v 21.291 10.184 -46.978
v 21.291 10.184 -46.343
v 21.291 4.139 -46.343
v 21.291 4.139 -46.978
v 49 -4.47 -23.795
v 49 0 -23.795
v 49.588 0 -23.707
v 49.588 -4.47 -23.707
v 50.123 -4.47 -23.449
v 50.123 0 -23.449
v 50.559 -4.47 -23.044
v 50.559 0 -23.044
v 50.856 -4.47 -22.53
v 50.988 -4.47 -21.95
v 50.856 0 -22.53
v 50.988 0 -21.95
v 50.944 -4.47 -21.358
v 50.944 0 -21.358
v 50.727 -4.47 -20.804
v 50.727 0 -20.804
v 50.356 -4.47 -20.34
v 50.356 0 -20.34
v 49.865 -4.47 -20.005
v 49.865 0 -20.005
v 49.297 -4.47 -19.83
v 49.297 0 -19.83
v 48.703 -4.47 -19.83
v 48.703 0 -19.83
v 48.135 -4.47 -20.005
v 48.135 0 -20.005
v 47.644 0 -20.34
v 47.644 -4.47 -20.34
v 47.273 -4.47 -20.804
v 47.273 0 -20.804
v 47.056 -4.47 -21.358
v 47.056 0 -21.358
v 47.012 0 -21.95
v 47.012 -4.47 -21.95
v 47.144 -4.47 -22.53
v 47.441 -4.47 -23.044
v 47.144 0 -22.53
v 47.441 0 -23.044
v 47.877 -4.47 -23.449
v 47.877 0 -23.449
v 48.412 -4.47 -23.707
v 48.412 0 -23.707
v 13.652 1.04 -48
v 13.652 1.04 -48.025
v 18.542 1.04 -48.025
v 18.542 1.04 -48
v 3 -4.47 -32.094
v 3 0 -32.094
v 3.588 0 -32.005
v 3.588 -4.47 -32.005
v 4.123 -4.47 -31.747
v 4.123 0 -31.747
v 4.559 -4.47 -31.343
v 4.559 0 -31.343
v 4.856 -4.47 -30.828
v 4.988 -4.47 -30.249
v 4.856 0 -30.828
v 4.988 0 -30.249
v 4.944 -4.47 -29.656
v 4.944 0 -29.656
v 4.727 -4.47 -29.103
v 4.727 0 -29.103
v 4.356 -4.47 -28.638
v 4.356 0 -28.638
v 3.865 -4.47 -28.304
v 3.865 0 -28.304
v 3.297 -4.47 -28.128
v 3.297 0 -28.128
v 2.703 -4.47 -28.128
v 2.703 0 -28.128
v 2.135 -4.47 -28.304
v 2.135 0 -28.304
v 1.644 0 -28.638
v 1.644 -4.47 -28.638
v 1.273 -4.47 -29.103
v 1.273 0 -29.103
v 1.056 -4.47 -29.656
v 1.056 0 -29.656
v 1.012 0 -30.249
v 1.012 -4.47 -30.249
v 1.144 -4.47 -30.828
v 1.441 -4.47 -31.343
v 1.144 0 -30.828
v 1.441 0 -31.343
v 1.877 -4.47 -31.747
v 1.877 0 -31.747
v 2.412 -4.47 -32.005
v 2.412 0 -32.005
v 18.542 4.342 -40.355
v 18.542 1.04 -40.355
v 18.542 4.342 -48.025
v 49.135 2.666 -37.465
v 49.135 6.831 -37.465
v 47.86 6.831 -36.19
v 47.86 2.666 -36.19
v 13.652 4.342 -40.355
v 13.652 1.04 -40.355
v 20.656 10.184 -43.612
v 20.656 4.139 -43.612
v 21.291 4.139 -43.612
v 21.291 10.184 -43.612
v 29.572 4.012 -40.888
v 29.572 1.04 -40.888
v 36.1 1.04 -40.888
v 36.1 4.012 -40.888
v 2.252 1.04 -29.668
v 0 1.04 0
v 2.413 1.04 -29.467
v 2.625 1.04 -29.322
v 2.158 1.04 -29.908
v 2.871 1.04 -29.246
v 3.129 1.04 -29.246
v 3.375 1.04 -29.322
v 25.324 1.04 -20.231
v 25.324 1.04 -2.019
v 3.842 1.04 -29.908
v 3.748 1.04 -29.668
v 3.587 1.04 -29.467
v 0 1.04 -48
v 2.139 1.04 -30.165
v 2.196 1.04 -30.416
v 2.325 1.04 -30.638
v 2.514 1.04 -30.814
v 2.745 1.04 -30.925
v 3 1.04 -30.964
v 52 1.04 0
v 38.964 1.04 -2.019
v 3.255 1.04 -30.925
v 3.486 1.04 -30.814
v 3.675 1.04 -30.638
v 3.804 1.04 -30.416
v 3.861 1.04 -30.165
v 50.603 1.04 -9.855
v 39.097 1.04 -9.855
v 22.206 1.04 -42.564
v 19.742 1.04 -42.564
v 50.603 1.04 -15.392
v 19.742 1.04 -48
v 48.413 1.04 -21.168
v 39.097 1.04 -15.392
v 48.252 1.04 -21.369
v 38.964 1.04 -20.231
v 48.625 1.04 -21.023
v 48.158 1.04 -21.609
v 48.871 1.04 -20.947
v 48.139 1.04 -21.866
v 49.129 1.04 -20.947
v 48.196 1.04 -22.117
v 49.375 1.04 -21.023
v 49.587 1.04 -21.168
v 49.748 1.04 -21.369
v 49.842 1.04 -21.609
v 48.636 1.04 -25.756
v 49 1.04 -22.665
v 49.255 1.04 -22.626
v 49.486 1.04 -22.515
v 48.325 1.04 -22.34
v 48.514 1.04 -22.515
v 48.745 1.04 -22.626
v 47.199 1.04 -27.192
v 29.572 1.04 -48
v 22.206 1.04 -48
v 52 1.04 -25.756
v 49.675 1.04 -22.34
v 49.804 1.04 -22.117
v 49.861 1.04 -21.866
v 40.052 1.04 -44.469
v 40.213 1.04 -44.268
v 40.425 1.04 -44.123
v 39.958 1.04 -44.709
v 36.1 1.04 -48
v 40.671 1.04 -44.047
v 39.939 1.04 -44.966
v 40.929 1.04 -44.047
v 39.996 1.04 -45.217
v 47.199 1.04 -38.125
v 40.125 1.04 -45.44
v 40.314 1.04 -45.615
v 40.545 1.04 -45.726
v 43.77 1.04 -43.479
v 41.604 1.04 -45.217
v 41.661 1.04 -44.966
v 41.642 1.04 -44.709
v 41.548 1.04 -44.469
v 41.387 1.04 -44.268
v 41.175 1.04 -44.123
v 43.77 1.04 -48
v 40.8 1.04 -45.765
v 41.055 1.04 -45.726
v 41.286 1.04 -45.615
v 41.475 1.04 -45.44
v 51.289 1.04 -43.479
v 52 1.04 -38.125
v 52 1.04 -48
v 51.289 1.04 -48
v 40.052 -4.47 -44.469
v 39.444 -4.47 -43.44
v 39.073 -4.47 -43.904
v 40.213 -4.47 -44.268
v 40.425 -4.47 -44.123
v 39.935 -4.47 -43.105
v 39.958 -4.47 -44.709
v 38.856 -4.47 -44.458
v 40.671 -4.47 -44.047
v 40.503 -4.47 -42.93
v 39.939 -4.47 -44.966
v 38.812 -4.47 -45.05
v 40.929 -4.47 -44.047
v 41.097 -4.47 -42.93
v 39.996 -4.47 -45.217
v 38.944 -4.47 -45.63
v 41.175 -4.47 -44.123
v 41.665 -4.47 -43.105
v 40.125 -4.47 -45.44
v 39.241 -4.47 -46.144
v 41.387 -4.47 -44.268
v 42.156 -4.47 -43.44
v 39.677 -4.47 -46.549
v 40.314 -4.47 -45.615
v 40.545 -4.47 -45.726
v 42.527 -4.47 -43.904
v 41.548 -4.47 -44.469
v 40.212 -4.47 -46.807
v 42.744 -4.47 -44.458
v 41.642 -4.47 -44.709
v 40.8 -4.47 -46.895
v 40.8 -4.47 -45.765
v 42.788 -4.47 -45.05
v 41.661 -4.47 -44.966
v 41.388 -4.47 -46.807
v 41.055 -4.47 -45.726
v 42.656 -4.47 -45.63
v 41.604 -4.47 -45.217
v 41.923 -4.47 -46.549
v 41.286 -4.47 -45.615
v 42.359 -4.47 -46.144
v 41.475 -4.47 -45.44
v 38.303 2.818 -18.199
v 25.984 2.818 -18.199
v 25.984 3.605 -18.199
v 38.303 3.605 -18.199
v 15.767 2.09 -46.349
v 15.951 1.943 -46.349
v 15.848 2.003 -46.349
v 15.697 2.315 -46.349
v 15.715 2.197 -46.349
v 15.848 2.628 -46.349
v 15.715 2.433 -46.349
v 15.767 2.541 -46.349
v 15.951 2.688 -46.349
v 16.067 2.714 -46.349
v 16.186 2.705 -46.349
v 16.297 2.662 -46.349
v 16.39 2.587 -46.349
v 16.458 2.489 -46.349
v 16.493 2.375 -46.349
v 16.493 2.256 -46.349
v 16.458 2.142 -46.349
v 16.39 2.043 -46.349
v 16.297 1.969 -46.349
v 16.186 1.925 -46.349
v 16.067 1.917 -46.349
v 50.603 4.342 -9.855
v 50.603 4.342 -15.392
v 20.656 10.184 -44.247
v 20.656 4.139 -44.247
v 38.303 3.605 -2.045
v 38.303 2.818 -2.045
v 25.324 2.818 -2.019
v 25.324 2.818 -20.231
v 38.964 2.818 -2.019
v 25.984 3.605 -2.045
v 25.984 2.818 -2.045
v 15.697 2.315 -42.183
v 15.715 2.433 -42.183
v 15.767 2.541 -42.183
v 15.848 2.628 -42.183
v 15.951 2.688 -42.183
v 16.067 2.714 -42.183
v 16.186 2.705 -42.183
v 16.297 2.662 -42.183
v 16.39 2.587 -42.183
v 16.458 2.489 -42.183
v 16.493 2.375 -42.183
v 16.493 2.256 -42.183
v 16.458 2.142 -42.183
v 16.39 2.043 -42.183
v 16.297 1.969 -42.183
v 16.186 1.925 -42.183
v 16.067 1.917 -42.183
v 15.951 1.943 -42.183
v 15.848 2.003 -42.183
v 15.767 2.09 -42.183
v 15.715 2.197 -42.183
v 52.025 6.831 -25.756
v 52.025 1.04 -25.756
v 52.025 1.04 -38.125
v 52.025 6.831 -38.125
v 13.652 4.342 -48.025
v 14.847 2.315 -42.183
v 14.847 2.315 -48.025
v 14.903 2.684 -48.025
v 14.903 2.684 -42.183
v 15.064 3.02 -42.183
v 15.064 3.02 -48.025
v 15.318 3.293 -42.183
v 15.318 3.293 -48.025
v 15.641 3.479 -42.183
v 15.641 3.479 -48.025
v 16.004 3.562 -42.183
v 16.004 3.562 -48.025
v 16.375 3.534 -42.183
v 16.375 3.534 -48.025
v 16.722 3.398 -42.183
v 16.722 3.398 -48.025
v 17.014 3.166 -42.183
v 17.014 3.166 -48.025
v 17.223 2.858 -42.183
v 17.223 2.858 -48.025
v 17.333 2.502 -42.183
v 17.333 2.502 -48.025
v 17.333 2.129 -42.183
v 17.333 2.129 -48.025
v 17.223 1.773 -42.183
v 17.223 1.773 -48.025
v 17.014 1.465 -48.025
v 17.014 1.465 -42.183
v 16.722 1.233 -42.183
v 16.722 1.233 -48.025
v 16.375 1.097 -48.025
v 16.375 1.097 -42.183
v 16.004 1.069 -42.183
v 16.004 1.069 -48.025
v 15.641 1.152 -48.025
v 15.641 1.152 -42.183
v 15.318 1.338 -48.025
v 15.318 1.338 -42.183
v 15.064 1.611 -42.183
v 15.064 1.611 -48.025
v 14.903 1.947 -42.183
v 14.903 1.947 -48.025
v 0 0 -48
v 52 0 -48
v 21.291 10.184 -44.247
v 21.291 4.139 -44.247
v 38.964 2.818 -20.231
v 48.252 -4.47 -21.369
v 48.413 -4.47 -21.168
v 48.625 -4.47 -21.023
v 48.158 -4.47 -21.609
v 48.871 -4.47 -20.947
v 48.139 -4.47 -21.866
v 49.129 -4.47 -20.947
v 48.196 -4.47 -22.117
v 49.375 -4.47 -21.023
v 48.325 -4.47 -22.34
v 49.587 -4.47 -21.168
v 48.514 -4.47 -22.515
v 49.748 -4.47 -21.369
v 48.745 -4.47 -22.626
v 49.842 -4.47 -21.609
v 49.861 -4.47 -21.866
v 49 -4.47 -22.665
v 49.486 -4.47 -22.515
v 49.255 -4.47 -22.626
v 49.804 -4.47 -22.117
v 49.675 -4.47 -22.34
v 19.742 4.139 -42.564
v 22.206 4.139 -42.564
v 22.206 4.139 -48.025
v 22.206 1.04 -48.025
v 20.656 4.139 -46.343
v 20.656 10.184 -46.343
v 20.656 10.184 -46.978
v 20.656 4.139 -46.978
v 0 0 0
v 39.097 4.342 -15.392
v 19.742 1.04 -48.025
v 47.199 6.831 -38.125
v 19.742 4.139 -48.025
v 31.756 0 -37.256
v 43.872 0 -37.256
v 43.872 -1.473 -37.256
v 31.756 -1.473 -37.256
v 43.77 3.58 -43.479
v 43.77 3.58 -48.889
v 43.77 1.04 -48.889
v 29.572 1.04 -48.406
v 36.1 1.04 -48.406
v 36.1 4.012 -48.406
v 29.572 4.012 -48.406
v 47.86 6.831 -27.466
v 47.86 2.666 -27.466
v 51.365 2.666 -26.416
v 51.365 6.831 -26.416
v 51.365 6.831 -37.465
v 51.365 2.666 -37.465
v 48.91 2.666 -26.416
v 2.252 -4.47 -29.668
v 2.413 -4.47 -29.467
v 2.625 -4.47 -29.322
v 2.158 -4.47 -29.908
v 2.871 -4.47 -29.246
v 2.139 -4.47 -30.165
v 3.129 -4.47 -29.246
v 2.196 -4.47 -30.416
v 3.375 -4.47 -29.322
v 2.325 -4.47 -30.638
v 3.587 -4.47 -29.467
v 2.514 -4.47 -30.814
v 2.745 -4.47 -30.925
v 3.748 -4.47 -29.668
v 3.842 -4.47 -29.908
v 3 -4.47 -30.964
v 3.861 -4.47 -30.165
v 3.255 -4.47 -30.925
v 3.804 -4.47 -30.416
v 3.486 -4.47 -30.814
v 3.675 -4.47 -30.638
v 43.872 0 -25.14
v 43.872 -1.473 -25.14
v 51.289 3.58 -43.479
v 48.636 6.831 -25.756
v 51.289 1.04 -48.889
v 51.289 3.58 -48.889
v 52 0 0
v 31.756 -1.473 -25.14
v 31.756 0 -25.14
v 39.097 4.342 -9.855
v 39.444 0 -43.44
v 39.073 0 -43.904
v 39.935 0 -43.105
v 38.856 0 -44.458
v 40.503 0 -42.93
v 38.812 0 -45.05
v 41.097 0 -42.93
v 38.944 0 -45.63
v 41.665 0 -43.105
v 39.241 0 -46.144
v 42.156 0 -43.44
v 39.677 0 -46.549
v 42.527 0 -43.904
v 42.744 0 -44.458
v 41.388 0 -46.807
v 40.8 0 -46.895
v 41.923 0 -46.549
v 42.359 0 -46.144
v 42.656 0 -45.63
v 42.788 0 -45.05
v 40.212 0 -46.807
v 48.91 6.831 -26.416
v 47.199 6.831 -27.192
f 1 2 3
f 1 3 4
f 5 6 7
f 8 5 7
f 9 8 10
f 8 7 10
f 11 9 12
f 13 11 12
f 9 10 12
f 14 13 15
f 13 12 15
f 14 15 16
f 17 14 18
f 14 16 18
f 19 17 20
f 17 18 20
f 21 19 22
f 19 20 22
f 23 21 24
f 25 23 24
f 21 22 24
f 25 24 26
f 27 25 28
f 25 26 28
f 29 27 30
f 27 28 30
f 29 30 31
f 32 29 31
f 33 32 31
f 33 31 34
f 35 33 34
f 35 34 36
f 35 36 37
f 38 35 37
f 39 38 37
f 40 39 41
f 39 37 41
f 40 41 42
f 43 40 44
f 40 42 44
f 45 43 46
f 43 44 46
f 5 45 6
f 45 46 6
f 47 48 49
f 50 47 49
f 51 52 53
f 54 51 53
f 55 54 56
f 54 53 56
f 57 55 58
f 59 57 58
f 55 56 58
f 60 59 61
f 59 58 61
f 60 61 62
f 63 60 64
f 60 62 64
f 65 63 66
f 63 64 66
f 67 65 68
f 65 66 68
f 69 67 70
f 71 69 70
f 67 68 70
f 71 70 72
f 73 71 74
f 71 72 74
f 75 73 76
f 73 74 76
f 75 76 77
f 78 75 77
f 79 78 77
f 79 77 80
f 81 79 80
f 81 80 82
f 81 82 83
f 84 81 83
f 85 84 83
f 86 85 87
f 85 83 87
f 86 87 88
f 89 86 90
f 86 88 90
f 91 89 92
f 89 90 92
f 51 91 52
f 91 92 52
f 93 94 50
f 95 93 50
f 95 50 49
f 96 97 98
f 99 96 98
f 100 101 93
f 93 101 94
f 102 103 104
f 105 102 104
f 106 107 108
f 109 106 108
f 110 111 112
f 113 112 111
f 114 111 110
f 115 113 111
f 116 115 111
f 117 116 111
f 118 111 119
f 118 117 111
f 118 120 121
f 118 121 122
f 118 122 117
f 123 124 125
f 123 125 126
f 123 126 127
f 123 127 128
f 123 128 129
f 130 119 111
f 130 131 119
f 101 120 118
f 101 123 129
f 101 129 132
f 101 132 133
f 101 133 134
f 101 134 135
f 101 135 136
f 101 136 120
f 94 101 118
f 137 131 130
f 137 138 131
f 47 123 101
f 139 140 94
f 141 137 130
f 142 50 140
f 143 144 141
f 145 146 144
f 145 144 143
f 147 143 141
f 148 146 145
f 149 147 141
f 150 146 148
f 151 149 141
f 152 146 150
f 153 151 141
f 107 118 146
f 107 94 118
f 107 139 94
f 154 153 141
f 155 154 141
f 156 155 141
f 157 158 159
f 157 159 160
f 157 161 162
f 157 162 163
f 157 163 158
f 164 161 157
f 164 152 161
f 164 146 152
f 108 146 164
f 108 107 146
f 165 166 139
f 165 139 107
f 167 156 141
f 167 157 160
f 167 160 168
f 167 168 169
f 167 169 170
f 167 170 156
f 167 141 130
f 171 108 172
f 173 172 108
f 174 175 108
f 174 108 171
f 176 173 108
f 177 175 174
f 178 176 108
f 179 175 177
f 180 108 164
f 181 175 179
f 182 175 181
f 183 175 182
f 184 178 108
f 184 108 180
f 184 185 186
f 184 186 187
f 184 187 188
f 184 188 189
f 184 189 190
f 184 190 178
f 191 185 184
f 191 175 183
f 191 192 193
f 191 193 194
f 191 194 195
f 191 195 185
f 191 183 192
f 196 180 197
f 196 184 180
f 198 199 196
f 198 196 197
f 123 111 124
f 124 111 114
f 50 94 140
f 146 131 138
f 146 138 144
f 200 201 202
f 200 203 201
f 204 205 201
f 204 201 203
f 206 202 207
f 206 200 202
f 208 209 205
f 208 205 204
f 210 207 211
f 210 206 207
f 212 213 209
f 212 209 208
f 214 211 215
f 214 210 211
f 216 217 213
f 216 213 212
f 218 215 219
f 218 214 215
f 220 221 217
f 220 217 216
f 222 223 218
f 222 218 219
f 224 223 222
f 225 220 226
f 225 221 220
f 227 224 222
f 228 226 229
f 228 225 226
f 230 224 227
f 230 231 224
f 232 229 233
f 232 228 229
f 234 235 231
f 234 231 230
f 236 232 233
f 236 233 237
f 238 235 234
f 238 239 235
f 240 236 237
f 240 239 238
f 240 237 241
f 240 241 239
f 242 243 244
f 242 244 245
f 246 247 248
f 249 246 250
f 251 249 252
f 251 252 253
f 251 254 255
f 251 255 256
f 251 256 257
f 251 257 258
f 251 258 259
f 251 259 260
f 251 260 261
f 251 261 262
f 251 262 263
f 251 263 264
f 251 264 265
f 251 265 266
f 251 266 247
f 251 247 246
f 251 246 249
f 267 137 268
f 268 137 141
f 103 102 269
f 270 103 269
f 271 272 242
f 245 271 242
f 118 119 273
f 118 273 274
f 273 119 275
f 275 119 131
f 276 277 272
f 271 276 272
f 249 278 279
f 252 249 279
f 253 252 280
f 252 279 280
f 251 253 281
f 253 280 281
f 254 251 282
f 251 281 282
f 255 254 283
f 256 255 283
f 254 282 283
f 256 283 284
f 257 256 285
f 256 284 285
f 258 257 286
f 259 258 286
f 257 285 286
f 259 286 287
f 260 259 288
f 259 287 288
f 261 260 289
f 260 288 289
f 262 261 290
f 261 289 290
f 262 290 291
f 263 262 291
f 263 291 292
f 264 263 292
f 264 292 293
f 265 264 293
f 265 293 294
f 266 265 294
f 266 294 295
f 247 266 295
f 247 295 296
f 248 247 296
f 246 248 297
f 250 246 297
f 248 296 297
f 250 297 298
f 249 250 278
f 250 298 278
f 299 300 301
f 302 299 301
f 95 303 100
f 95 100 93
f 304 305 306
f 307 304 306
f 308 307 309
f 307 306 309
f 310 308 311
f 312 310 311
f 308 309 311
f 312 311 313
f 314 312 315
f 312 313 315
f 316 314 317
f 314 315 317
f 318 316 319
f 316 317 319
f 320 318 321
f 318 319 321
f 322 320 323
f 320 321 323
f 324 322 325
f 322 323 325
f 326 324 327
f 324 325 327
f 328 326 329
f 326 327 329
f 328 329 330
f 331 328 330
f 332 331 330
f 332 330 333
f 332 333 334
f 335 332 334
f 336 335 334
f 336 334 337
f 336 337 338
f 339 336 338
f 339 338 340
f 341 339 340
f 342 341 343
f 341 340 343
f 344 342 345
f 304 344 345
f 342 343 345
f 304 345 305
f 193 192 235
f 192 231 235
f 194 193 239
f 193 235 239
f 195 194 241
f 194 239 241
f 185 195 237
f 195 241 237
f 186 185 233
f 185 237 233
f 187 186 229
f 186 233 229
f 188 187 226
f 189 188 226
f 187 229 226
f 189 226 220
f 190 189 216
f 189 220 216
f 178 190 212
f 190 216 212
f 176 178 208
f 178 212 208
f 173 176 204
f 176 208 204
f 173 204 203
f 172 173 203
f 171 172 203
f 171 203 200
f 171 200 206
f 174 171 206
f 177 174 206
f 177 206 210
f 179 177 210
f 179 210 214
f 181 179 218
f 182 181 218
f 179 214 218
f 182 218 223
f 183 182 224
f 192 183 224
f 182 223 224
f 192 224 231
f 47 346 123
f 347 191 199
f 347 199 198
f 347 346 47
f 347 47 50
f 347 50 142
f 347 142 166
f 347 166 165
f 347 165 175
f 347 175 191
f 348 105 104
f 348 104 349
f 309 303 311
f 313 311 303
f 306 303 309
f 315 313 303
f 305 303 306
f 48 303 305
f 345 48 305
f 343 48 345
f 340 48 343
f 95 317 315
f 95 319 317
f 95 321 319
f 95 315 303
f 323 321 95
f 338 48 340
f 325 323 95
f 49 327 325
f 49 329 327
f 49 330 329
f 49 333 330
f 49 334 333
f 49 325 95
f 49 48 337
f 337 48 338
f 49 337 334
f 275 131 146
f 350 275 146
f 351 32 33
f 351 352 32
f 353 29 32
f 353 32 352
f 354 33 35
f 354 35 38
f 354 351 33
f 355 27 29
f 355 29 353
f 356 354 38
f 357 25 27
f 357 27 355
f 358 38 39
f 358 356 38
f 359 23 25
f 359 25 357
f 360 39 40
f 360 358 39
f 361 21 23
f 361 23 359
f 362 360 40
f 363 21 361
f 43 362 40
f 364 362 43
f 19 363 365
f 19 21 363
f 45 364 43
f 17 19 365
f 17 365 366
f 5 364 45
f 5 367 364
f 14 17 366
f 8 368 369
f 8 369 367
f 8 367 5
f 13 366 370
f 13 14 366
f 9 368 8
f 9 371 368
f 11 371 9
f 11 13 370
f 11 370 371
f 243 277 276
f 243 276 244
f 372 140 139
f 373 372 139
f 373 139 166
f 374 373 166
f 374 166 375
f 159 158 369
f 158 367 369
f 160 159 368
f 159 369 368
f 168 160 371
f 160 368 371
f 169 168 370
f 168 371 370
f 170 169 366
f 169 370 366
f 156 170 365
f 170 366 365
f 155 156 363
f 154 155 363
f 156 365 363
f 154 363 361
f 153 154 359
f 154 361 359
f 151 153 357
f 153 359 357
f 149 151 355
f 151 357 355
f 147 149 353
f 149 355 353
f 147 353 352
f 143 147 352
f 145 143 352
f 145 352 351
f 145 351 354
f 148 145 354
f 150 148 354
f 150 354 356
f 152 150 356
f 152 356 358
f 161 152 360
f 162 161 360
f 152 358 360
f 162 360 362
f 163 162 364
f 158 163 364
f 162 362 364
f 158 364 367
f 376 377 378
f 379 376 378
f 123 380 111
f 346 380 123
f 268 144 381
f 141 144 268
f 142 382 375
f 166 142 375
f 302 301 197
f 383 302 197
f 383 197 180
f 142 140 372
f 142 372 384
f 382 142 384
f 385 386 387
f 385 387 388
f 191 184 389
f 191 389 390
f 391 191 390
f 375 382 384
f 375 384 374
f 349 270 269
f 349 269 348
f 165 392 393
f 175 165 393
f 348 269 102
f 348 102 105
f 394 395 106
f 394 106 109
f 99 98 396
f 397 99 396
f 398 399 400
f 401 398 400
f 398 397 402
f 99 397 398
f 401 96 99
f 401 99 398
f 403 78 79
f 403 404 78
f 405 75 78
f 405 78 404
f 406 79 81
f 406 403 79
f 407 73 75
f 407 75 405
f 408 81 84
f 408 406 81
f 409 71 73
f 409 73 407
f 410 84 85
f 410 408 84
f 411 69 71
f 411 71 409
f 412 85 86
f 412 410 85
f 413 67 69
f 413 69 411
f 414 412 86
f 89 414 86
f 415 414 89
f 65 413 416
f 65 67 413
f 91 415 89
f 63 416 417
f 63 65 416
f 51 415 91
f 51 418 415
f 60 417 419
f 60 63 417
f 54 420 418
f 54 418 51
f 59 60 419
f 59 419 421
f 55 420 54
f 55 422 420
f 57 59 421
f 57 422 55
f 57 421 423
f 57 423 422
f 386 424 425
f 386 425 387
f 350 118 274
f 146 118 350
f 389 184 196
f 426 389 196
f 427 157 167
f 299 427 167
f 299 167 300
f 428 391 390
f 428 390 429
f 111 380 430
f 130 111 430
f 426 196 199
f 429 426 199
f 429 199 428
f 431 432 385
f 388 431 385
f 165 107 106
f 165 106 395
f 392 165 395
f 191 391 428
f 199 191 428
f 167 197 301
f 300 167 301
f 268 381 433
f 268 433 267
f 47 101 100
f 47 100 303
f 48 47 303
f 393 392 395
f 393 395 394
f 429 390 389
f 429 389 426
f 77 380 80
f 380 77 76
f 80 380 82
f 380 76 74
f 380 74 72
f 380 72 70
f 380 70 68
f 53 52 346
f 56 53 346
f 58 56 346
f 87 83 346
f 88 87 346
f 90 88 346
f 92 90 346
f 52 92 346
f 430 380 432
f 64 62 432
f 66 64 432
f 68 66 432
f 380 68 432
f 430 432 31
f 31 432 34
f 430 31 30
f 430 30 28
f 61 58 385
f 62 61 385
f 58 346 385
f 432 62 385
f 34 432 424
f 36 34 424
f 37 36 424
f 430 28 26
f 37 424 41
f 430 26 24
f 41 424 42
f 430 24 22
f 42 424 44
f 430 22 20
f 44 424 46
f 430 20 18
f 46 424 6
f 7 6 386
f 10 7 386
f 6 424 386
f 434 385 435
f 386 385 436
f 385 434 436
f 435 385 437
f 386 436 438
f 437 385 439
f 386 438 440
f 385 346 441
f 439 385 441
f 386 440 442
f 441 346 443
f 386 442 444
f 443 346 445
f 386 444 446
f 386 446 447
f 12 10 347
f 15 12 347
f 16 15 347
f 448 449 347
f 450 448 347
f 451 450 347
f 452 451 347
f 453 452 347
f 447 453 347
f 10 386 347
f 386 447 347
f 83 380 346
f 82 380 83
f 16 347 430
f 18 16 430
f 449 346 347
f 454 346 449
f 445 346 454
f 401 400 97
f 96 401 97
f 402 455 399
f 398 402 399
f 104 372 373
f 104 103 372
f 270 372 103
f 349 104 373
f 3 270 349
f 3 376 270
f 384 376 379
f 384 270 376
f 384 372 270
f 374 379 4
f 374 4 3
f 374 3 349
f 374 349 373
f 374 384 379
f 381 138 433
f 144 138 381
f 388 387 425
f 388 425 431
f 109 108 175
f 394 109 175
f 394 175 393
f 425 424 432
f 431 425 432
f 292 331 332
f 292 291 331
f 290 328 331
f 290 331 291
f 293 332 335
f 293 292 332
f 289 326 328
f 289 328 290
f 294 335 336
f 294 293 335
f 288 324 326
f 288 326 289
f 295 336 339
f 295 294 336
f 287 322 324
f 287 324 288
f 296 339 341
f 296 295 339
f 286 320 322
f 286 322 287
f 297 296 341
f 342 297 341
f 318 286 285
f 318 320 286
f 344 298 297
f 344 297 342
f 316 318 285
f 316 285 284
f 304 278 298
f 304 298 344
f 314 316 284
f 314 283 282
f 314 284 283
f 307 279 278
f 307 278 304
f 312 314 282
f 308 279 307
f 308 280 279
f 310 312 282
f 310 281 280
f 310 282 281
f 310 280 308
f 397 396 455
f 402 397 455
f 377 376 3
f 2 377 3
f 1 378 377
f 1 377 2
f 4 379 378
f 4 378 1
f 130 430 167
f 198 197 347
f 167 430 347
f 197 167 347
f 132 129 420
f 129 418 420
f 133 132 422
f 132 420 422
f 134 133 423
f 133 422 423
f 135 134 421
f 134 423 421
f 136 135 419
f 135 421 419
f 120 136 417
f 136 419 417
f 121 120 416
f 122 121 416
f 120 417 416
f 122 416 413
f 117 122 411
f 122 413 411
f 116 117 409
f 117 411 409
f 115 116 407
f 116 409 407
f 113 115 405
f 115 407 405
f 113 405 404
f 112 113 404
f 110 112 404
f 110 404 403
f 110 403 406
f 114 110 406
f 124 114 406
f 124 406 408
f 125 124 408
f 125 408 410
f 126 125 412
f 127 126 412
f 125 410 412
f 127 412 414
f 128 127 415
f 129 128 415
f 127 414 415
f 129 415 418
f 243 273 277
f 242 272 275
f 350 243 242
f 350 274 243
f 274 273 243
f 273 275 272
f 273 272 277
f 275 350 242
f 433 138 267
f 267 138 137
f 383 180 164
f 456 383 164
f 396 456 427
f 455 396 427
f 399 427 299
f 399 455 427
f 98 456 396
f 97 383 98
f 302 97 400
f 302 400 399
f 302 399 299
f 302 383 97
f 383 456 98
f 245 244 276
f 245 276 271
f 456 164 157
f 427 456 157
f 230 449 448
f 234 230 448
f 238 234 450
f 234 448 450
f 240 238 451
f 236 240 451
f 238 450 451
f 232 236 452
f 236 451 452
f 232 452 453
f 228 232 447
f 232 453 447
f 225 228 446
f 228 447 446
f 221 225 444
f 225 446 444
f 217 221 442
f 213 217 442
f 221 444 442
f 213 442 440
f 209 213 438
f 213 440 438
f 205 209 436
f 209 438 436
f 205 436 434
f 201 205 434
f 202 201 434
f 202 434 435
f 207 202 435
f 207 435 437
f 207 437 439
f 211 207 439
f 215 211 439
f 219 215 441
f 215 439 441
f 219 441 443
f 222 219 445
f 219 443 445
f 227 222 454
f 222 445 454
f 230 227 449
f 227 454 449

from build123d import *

# Parameters (mm, degrees)
SKETCH1_W                  = 52
SKETCH1_H                  = 48
BASE_DEPTH                 = 1.04
SKETCH8_W                  = 4.8895
SKETCH8_H                  = 7.6708
DC_POWER_DEPTH             = 3.302
SKETCH9_R                  = 1.25
DC_POWER_HOLE_DEPTH        = 5.842
SKETCH10_R                 = 0.4
DC_POWER_PIN_DEPTH         = 4.1656
SKETCH11_W                 = 2.4638
SKETCH11_H                 = 5.461
PWM_PIN_BASE_DEPTH         = 3.0988
SKETCH12_W                 = 0.635
SKETCH12_H                 = 0.635
PWM_PINS_DEPTH             = 6.0452
SKETCH13_W                 = 6.5278
SKETCH13_H                 = 7.5184
MICRO_HDMI_PORT_DEPTH      = 2.9718
SKETCH14_W                 = 7.5184
SKETCH14_H                 = 5.4102
MICRO_USB_PORT_DEPTH       = 2.54
HEADER_HOLE_REACH          = 74.096
SKETCH15_R                 = 0.8636
SKETCH16_R                 = 1.9939
STANDOFFS_1_DEPTH          = 4.4704
SKETCH17_R                 = 1.9939
SHORT_STANDOFF_DEPTH       = 4.4704
THREADS_IN_STANDOFFS_REACH = 74.096
SKETCH19_R                 = 0.8636
SKETCH20_W                 = 12.1158
SKETCH20_H                 = 12.1158
CPU_DEPTH                  = 1.4732
UART_PLASTIC_DEPTH         = 5.7912
UART_HOLE_DEPTH            = 4.1656
SKETCH23_W                 = 11.5062
SKETCH23_H                 = 5.5372
MICROSD_DEPTH              = 3.302
SKETCH24_W                 = 13.6398
SKETCH24_H                 = 18.2118
EMMC_BOARD_DEPTH           = 1.778
SKETCH25_W                 = 12.319
SKETCH25_H                 = 16.1544
EMMC_CHIP_DEPTH            = 0.7874


with BuildPart() as part:
    # Sketch1 → Base (new body)
    with BuildSketch(Plane(origin=(0, 0, 0), x_dir=(1, 0, 0), z_dir=(0, 1, 0))):
        with Locations((26, 24)):
            Rectangle(SKETCH1_W, SKETCH1_H)
    extrude(amount=BASE_DEPTH)

    # Sketch8 → DC power (add)
    with BuildSketch(Plane(origin=(0, 1.04, 0), x_dir=(1, 0, 0), z_dir=(0, 1, 0))):
        with Locations((16.09725, 44.19)):
            Rectangle(SKETCH8_W, SKETCH8_H)
    extrude(amount=DC_POWER_DEPTH)

    # Sketch9 → DC power hole (cut)
    with BuildSketch(Plane(origin=(0, 0, -48.0254), x_dir=(-1, 0, 0), z_dir=(0, 0, -1))):
        with Locations((-16.09725, 2.3154)):
            Circle(SKETCH9_R)
    extrude(amount=-DC_POWER_HOLE_DEPTH, mode=Mode.SUBTRACT)

    # Sketch10 → DC power pin (add)
    with BuildSketch(Plane(origin=(0, 0, -42.1834), x_dir=(-1, 0, 0), z_dir=(0, 0, -1))):
        with Locations((-16.09725, 2.3154)):
            Circle(SKETCH10_R)
    extrude(amount=DC_POWER_PIN_DEPTH)

    # Sketch11 → PWM pin base (add)
    with BuildSketch(Plane(origin=(0, 1.04, 0), x_dir=(1, 0, 0), z_dir=(0, 1, 0))):
        with Locations((20.9739, 45.2949)):
            Rectangle(SKETCH11_W, SKETCH11_H)
    extrude(amount=PWM_PIN_BASE_DEPTH)

    # Sketch12 → PWM pins (add)
    with BuildSketch(Plane(origin=(0, 4.1388, 0), x_dir=(1, 0, 0), z_dir=(0, 1, 0))):
        with Locations((20.9739, 43.92965)):
            Rectangle(SKETCH12_W, SKETCH12_H)
        with Locations((20.9739, 46.66015)):
            Rectangle(SKETCH12_W, SKETCH12_H)
    extrude(amount=PWM_PINS_DEPTH)

    # Sketch13 → Micro HDMI port (add)
    with BuildSketch(Plane(origin=(0, 1.04, 0), x_dir=(1, 0, 0), z_dir=(0, 1, 0))):
        with Locations((32.8357, 44.6472)):
            Rectangle(SKETCH13_W, SKETCH13_H)
    extrude(amount=MICRO_HDMI_PORT_DEPTH)

    # Sketch14 → Micro USB port (add)
    with BuildSketch(Plane(origin=(0, 1.04, 0), x_dir=(1, 0, 0), z_dir=(0, 1, 0))):
        with Locations((47.5296, 46.1839)):
            Rectangle(SKETCH14_W, SKETCH14_H)
    extrude(amount=MICRO_USB_PORT_DEPTH)

    # Sketch15 → Header hole (cut, up to next)
    with BuildSketch(Plane(origin=(0, 0, 0), x_dir=(-1, 0, 0), z_dir=(0, -1, 0)), mode=Mode.PRIVATE) as header_hole_sk1:
        with Locations(Location((-3, 30.1, 0), (0, 0, 90))):
            Circle(SKETCH15_R)
    header_hole_tool1 = extrude(header_hole_sk1.sketch, amount=-HEADER_HOLE_REACH, mode=Mode.PRIVATE) & part.part
    # Sketch15 → Header hole (cut, up to next)
    with BuildSketch(Plane(origin=(0, 0, 0), x_dir=(-1, 0, 0), z_dir=(0, -1, 0)), mode=Mode.PRIVATE) as header_hole_sk2:
        with Locations(Location((-49, 21.8012, 0), (0, 0, 90))):
            Circle(SKETCH15_R)
    header_hole_tool2 = extrude(header_hole_sk2.sketch, amount=-HEADER_HOLE_REACH, mode=Mode.PRIVATE) & part.part
    # Sketch15 → Header hole (cut, up to next)
    with BuildSketch(Plane(origin=(0, 0, 0), x_dir=(-1, 0, 0), z_dir=(0, -1, 0)), mode=Mode.PRIVATE) as header_hole_sk3:
        with Locations(Location((-40.8, 44.9012, 0), (0, 0, 90))):
            Circle(SKETCH15_R)
    header_hole_tool3 = extrude(header_hole_sk3.sketch, amount=-HEADER_HOLE_REACH, mode=Mode.PRIVATE) & part.part
    add(header_hole_tool1.solids().sort_by_distance((3, 0, -30.1))[0], mode=Mode.SUBTRACT)
    add(header_hole_tool2.solids().sort_by_distance((49, 0, -21.8012))[0], mode=Mode.SUBTRACT)
    add(header_hole_tool3.solids().sort_by_distance((40.8, 0, -44.9012))[0], mode=Mode.SUBTRACT)

    # Sketch16 → Standoffs 1 (add)
    with BuildSketch(Plane.XZ):
        with Locations(Location((49, -21.8012, 0), (0, 0, 270))):
            Circle(SKETCH16_R)
        with Locations(Location((3, -30.1, 0), (0, 0, 270))):
            Circle(SKETCH16_R)
    extrude(amount=STANDOFFS_1_DEPTH)

    # Sketch17 → Short standoff (add)
    with BuildSketch(Plane.XZ):
        with Locations(Location((40.8, -44.9012, 0), (0, 0, 270))):
            Circle(SKETCH17_R)
    extrude(amount=SHORT_STANDOFF_DEPTH)

    # Sketch19 → Threads in standoffs (cut, up to next)
    with BuildSketch(Plane.XZ, mode=Mode.PRIVATE) as threads_in_standoffs_sk1:
        with Locations(Location((40.8, -44.9012, 0), (0, 0, 270))):
            Circle(SKETCH19_R)
    threads_in_standoffs_tool1 = extrude(threads_in_standoffs_sk1.sketch, amount=THREADS_IN_STANDOFFS_REACH, mode=Mode.PRIVATE) & part.part
    # Sketch19 → Threads in standoffs (cut, up to next)
    with BuildSketch(Plane.XZ, mode=Mode.PRIVATE) as threads_in_standoffs_sk2:
        with Locations(Location((49, -21.8012, 0), (0, 0, 270))):
            Circle(SKETCH19_R)
    threads_in_standoffs_tool2 = extrude(threads_in_standoffs_sk2.sketch, amount=THREADS_IN_STANDOFFS_REACH, mode=Mode.PRIVATE) & part.part
    # Sketch19 → Threads in standoffs (cut, up to next)
    with BuildSketch(Plane.XZ, mode=Mode.PRIVATE) as threads_in_standoffs_sk3:
        with Locations(Location((3, -30.1, 0), (0, 0, 270))):
            Circle(SKETCH19_R)
    threads_in_standoffs_tool3 = extrude(threads_in_standoffs_sk3.sketch, amount=THREADS_IN_STANDOFFS_REACH, mode=Mode.PRIVATE) & part.part
    add(threads_in_standoffs_tool1.solids().sort_by_distance((40.8, 0, -44.9012))[0], mode=Mode.SUBTRACT)
    add(threads_in_standoffs_tool2.solids().sort_by_distance((49, 0, -21.8012))[0], mode=Mode.SUBTRACT)
    add(threads_in_standoffs_tool3.solids().sort_by_distance((3, 0, -30.1))[0], mode=Mode.SUBTRACT)

    # Sketch20 → CPU (add)
    with BuildSketch(Plane(origin=(0, 0, 0), x_dir=(-1, 0, 0), z_dir=(0, -1, 0))):
        with Locations((-37.8141, 31.1979)):
            Rectangle(SKETCH20_W, SKETCH20_H)
    extrude(amount=CPU_DEPTH)

    # Sketch21 → UART plastic (add)
    with BuildSketch(Plane(origin=(0, 1.04, 0), x_dir=(1, 0, 0), z_dir=(0, 1, 0))):
        Polygon((52.0254, 38.1254), (47.1994, 38.1254), (47.1994, 27.192440979), (48.636240979, 25.7556), (52.0254, 25.7556), align=None)
    extrude(amount=UART_PLASTIC_DEPTH)

    # Sketch22 → UART hole (cut)
    with BuildSketch(Plane(origin=(0, 6.8312, 0), x_dir=(1, 0, 0), z_dir=(0, 1, 0))):
        Polygon((51.365, 37.465), (49.134996369, 37.465), (47.8598, 36.189803631), (47.8598, 27.465987616), (48.909787616, 26.416), (51.365, 26.416), align=None)
    extrude(amount=-UART_HOLE_DEPTH, mode=Mode.SUBTRACT)

    # Sketch23 → MicroSD (add)
    with BuildSketch(Plane(origin=(0, 1.04, 0), x_dir=(1, 0, 0), z_dir=(0, 1, 0))):
        with Locations((44.8499, 12.6238)):
            Rectangle(SKETCH23_W, SKETCH23_H)
    extrude(amount=MICROSD_DEPTH)

    # Sketch24 → eMMC board (add)
    with BuildSketch(Plane(origin=(0, 1.04, 0), x_dir=(1, 0, 0), z_dir=(0, 1, 0))):
        with Locations((32.1437, 11.1252)):
            Rectangle(SKETCH24_W, SKETCH24_H)
    extrude(amount=EMMC_BOARD_DEPTH)

    # Sketch25 → eMMC chip (add)
    with BuildSketch(Plane(origin=(0, 2.818, 0), x_dir=(1, 0, 0), z_dir=(0, 1, 0))):
        with Locations((32.1437, 10.1219)):
            Rectangle(SKETCH25_W, SKETCH25_H)
    extrude(amount=EMMC_CHIP_DEPTH)


solid = part.part
